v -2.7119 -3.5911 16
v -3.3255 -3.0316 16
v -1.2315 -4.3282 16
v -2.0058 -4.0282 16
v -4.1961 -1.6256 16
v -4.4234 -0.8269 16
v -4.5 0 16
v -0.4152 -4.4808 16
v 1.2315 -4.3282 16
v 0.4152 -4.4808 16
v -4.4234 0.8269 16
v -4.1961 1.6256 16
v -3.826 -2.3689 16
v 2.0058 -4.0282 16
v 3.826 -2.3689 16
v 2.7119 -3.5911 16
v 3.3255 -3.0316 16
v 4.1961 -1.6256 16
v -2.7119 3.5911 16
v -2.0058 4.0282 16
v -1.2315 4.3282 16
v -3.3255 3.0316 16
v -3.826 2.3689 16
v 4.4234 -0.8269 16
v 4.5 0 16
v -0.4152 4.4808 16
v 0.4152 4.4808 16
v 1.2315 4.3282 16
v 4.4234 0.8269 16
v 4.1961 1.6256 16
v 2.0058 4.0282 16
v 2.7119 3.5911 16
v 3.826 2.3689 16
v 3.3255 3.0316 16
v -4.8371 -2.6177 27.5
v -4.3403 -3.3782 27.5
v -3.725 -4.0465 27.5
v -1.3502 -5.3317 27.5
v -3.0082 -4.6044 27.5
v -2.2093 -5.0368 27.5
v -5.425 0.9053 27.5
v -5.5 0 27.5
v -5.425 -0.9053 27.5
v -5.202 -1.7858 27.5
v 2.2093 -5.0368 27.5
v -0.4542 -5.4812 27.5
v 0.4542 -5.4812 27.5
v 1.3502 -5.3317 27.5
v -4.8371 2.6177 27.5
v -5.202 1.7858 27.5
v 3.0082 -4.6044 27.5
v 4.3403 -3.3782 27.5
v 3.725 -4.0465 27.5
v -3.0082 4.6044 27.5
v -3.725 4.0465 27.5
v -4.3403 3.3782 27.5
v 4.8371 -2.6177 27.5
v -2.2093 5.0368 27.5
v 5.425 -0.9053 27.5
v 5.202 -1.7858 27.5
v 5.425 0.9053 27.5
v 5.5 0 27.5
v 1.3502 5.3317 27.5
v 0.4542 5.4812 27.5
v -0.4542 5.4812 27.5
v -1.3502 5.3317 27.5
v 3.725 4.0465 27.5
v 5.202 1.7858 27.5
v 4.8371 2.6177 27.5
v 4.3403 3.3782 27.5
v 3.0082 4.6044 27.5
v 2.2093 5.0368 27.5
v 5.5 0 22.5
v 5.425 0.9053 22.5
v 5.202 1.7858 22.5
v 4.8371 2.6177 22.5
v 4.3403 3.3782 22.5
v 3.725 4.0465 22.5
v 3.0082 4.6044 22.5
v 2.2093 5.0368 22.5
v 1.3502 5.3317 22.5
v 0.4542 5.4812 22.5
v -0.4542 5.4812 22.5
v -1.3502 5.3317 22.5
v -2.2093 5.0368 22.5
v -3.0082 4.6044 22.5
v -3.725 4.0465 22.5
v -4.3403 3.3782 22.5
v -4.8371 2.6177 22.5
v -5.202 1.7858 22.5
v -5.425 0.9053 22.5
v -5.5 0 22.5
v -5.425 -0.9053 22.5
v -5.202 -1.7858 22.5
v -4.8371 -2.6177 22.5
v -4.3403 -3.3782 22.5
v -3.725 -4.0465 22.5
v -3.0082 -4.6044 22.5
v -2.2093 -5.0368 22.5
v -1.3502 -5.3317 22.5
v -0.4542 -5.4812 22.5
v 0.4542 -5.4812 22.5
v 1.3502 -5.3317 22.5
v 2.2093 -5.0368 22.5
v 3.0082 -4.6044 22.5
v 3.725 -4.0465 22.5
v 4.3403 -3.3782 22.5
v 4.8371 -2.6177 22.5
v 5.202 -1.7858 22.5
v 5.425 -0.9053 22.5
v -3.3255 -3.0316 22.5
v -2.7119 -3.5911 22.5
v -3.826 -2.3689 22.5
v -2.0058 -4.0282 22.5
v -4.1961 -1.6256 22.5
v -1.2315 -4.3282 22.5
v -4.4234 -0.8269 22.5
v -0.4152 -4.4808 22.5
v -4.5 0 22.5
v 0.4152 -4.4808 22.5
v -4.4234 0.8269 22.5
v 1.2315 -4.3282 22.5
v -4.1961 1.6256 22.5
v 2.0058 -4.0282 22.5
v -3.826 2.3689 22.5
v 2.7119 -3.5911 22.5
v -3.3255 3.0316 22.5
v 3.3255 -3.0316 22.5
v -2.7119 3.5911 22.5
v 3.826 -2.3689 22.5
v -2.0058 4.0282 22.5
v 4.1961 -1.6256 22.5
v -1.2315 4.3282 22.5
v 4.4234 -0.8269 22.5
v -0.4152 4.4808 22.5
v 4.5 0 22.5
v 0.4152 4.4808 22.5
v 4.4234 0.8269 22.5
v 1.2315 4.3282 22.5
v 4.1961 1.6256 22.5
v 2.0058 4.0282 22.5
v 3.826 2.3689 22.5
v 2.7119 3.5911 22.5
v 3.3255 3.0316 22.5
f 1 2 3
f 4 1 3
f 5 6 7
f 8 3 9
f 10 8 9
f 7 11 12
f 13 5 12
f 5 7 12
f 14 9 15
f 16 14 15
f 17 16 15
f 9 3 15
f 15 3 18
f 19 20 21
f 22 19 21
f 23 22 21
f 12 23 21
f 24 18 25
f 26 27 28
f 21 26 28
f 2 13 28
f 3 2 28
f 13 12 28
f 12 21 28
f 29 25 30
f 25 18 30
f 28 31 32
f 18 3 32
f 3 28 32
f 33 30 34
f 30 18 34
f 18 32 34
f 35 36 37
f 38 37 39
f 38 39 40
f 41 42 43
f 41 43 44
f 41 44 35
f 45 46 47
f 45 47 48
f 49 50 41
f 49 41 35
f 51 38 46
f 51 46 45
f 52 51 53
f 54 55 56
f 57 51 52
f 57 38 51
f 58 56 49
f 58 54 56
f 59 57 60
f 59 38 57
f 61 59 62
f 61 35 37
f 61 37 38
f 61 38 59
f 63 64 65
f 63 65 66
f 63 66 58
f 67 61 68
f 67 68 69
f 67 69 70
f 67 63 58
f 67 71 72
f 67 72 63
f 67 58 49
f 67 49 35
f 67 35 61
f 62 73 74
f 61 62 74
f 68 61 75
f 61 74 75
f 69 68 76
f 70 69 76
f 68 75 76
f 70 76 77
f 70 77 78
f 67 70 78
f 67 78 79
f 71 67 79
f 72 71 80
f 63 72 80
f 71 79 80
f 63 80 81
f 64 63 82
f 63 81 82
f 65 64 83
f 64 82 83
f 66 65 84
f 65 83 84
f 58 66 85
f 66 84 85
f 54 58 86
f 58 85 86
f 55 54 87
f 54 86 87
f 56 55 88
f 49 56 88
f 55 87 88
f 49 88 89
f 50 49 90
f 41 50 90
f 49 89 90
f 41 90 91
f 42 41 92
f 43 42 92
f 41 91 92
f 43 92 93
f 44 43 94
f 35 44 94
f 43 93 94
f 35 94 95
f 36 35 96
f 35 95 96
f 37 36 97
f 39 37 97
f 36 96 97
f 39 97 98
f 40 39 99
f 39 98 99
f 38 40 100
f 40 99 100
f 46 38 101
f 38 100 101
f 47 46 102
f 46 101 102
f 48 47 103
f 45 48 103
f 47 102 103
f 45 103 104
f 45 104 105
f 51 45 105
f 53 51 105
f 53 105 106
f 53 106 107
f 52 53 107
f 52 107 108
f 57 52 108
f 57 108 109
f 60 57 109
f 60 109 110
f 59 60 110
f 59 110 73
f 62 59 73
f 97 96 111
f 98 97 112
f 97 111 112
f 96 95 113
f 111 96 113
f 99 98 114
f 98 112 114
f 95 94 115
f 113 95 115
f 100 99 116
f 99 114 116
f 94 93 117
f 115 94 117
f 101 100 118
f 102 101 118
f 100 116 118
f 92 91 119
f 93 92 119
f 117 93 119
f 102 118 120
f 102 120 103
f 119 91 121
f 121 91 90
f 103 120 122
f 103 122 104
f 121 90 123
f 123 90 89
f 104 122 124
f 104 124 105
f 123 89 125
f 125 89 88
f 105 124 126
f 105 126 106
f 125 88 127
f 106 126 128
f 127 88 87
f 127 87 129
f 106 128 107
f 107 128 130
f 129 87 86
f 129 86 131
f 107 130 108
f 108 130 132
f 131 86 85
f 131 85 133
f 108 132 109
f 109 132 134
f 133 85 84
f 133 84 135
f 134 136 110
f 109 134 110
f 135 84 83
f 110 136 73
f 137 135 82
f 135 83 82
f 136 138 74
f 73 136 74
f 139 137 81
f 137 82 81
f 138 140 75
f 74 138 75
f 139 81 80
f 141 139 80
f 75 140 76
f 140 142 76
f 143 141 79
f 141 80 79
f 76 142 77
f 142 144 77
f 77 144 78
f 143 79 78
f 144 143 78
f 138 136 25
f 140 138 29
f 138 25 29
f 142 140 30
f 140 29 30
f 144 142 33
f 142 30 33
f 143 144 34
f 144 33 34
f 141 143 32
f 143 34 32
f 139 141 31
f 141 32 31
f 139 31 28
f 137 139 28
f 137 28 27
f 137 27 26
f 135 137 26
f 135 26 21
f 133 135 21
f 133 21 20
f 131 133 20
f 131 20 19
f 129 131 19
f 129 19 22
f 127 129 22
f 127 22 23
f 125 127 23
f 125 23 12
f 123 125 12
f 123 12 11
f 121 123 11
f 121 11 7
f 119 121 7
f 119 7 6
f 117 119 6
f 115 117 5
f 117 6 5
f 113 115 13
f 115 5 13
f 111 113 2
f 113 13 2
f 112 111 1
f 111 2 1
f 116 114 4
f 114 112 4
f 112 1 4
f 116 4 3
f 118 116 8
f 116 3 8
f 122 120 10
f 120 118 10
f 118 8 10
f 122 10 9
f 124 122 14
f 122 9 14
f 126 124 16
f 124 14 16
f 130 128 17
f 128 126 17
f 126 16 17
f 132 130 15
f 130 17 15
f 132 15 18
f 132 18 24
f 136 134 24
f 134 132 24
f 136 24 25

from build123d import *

# Parameters (mm, degrees)
CYLINDER003_R     = 5.5
CYLINDER003_DEPTH = 5
CYLINDER002_R     = 4.5
CYLINDER002_DEPTH = 6.6


with BuildPart() as centre002:
    # Cylinder003 → Cylinder003 (new body)
    with BuildSketch(Plane.XY.offset(-2.5)):
        Circle(CYLINDER003_R)
    extrude(amount=CYLINDER003_DEPTH)


with BuildPart() as worm_driven_gear:
    # Cylinder002 → Cylinder002 (new body)
    with BuildSketch(Plane.XY.offset(-9)):
        Circle(CYLINDER002_R)
    extrude(amount=CYLINDER002_DEPTH)

    # Fusion: union centre002
    add(centre002.part)


with BuildPart() as worm_driven_gear_1:
    # Fusion placement: moved
    add(worm_driven_gear.part.moved(Location((0, 0, 25))))


solid = worm_driven_gear_1.part
